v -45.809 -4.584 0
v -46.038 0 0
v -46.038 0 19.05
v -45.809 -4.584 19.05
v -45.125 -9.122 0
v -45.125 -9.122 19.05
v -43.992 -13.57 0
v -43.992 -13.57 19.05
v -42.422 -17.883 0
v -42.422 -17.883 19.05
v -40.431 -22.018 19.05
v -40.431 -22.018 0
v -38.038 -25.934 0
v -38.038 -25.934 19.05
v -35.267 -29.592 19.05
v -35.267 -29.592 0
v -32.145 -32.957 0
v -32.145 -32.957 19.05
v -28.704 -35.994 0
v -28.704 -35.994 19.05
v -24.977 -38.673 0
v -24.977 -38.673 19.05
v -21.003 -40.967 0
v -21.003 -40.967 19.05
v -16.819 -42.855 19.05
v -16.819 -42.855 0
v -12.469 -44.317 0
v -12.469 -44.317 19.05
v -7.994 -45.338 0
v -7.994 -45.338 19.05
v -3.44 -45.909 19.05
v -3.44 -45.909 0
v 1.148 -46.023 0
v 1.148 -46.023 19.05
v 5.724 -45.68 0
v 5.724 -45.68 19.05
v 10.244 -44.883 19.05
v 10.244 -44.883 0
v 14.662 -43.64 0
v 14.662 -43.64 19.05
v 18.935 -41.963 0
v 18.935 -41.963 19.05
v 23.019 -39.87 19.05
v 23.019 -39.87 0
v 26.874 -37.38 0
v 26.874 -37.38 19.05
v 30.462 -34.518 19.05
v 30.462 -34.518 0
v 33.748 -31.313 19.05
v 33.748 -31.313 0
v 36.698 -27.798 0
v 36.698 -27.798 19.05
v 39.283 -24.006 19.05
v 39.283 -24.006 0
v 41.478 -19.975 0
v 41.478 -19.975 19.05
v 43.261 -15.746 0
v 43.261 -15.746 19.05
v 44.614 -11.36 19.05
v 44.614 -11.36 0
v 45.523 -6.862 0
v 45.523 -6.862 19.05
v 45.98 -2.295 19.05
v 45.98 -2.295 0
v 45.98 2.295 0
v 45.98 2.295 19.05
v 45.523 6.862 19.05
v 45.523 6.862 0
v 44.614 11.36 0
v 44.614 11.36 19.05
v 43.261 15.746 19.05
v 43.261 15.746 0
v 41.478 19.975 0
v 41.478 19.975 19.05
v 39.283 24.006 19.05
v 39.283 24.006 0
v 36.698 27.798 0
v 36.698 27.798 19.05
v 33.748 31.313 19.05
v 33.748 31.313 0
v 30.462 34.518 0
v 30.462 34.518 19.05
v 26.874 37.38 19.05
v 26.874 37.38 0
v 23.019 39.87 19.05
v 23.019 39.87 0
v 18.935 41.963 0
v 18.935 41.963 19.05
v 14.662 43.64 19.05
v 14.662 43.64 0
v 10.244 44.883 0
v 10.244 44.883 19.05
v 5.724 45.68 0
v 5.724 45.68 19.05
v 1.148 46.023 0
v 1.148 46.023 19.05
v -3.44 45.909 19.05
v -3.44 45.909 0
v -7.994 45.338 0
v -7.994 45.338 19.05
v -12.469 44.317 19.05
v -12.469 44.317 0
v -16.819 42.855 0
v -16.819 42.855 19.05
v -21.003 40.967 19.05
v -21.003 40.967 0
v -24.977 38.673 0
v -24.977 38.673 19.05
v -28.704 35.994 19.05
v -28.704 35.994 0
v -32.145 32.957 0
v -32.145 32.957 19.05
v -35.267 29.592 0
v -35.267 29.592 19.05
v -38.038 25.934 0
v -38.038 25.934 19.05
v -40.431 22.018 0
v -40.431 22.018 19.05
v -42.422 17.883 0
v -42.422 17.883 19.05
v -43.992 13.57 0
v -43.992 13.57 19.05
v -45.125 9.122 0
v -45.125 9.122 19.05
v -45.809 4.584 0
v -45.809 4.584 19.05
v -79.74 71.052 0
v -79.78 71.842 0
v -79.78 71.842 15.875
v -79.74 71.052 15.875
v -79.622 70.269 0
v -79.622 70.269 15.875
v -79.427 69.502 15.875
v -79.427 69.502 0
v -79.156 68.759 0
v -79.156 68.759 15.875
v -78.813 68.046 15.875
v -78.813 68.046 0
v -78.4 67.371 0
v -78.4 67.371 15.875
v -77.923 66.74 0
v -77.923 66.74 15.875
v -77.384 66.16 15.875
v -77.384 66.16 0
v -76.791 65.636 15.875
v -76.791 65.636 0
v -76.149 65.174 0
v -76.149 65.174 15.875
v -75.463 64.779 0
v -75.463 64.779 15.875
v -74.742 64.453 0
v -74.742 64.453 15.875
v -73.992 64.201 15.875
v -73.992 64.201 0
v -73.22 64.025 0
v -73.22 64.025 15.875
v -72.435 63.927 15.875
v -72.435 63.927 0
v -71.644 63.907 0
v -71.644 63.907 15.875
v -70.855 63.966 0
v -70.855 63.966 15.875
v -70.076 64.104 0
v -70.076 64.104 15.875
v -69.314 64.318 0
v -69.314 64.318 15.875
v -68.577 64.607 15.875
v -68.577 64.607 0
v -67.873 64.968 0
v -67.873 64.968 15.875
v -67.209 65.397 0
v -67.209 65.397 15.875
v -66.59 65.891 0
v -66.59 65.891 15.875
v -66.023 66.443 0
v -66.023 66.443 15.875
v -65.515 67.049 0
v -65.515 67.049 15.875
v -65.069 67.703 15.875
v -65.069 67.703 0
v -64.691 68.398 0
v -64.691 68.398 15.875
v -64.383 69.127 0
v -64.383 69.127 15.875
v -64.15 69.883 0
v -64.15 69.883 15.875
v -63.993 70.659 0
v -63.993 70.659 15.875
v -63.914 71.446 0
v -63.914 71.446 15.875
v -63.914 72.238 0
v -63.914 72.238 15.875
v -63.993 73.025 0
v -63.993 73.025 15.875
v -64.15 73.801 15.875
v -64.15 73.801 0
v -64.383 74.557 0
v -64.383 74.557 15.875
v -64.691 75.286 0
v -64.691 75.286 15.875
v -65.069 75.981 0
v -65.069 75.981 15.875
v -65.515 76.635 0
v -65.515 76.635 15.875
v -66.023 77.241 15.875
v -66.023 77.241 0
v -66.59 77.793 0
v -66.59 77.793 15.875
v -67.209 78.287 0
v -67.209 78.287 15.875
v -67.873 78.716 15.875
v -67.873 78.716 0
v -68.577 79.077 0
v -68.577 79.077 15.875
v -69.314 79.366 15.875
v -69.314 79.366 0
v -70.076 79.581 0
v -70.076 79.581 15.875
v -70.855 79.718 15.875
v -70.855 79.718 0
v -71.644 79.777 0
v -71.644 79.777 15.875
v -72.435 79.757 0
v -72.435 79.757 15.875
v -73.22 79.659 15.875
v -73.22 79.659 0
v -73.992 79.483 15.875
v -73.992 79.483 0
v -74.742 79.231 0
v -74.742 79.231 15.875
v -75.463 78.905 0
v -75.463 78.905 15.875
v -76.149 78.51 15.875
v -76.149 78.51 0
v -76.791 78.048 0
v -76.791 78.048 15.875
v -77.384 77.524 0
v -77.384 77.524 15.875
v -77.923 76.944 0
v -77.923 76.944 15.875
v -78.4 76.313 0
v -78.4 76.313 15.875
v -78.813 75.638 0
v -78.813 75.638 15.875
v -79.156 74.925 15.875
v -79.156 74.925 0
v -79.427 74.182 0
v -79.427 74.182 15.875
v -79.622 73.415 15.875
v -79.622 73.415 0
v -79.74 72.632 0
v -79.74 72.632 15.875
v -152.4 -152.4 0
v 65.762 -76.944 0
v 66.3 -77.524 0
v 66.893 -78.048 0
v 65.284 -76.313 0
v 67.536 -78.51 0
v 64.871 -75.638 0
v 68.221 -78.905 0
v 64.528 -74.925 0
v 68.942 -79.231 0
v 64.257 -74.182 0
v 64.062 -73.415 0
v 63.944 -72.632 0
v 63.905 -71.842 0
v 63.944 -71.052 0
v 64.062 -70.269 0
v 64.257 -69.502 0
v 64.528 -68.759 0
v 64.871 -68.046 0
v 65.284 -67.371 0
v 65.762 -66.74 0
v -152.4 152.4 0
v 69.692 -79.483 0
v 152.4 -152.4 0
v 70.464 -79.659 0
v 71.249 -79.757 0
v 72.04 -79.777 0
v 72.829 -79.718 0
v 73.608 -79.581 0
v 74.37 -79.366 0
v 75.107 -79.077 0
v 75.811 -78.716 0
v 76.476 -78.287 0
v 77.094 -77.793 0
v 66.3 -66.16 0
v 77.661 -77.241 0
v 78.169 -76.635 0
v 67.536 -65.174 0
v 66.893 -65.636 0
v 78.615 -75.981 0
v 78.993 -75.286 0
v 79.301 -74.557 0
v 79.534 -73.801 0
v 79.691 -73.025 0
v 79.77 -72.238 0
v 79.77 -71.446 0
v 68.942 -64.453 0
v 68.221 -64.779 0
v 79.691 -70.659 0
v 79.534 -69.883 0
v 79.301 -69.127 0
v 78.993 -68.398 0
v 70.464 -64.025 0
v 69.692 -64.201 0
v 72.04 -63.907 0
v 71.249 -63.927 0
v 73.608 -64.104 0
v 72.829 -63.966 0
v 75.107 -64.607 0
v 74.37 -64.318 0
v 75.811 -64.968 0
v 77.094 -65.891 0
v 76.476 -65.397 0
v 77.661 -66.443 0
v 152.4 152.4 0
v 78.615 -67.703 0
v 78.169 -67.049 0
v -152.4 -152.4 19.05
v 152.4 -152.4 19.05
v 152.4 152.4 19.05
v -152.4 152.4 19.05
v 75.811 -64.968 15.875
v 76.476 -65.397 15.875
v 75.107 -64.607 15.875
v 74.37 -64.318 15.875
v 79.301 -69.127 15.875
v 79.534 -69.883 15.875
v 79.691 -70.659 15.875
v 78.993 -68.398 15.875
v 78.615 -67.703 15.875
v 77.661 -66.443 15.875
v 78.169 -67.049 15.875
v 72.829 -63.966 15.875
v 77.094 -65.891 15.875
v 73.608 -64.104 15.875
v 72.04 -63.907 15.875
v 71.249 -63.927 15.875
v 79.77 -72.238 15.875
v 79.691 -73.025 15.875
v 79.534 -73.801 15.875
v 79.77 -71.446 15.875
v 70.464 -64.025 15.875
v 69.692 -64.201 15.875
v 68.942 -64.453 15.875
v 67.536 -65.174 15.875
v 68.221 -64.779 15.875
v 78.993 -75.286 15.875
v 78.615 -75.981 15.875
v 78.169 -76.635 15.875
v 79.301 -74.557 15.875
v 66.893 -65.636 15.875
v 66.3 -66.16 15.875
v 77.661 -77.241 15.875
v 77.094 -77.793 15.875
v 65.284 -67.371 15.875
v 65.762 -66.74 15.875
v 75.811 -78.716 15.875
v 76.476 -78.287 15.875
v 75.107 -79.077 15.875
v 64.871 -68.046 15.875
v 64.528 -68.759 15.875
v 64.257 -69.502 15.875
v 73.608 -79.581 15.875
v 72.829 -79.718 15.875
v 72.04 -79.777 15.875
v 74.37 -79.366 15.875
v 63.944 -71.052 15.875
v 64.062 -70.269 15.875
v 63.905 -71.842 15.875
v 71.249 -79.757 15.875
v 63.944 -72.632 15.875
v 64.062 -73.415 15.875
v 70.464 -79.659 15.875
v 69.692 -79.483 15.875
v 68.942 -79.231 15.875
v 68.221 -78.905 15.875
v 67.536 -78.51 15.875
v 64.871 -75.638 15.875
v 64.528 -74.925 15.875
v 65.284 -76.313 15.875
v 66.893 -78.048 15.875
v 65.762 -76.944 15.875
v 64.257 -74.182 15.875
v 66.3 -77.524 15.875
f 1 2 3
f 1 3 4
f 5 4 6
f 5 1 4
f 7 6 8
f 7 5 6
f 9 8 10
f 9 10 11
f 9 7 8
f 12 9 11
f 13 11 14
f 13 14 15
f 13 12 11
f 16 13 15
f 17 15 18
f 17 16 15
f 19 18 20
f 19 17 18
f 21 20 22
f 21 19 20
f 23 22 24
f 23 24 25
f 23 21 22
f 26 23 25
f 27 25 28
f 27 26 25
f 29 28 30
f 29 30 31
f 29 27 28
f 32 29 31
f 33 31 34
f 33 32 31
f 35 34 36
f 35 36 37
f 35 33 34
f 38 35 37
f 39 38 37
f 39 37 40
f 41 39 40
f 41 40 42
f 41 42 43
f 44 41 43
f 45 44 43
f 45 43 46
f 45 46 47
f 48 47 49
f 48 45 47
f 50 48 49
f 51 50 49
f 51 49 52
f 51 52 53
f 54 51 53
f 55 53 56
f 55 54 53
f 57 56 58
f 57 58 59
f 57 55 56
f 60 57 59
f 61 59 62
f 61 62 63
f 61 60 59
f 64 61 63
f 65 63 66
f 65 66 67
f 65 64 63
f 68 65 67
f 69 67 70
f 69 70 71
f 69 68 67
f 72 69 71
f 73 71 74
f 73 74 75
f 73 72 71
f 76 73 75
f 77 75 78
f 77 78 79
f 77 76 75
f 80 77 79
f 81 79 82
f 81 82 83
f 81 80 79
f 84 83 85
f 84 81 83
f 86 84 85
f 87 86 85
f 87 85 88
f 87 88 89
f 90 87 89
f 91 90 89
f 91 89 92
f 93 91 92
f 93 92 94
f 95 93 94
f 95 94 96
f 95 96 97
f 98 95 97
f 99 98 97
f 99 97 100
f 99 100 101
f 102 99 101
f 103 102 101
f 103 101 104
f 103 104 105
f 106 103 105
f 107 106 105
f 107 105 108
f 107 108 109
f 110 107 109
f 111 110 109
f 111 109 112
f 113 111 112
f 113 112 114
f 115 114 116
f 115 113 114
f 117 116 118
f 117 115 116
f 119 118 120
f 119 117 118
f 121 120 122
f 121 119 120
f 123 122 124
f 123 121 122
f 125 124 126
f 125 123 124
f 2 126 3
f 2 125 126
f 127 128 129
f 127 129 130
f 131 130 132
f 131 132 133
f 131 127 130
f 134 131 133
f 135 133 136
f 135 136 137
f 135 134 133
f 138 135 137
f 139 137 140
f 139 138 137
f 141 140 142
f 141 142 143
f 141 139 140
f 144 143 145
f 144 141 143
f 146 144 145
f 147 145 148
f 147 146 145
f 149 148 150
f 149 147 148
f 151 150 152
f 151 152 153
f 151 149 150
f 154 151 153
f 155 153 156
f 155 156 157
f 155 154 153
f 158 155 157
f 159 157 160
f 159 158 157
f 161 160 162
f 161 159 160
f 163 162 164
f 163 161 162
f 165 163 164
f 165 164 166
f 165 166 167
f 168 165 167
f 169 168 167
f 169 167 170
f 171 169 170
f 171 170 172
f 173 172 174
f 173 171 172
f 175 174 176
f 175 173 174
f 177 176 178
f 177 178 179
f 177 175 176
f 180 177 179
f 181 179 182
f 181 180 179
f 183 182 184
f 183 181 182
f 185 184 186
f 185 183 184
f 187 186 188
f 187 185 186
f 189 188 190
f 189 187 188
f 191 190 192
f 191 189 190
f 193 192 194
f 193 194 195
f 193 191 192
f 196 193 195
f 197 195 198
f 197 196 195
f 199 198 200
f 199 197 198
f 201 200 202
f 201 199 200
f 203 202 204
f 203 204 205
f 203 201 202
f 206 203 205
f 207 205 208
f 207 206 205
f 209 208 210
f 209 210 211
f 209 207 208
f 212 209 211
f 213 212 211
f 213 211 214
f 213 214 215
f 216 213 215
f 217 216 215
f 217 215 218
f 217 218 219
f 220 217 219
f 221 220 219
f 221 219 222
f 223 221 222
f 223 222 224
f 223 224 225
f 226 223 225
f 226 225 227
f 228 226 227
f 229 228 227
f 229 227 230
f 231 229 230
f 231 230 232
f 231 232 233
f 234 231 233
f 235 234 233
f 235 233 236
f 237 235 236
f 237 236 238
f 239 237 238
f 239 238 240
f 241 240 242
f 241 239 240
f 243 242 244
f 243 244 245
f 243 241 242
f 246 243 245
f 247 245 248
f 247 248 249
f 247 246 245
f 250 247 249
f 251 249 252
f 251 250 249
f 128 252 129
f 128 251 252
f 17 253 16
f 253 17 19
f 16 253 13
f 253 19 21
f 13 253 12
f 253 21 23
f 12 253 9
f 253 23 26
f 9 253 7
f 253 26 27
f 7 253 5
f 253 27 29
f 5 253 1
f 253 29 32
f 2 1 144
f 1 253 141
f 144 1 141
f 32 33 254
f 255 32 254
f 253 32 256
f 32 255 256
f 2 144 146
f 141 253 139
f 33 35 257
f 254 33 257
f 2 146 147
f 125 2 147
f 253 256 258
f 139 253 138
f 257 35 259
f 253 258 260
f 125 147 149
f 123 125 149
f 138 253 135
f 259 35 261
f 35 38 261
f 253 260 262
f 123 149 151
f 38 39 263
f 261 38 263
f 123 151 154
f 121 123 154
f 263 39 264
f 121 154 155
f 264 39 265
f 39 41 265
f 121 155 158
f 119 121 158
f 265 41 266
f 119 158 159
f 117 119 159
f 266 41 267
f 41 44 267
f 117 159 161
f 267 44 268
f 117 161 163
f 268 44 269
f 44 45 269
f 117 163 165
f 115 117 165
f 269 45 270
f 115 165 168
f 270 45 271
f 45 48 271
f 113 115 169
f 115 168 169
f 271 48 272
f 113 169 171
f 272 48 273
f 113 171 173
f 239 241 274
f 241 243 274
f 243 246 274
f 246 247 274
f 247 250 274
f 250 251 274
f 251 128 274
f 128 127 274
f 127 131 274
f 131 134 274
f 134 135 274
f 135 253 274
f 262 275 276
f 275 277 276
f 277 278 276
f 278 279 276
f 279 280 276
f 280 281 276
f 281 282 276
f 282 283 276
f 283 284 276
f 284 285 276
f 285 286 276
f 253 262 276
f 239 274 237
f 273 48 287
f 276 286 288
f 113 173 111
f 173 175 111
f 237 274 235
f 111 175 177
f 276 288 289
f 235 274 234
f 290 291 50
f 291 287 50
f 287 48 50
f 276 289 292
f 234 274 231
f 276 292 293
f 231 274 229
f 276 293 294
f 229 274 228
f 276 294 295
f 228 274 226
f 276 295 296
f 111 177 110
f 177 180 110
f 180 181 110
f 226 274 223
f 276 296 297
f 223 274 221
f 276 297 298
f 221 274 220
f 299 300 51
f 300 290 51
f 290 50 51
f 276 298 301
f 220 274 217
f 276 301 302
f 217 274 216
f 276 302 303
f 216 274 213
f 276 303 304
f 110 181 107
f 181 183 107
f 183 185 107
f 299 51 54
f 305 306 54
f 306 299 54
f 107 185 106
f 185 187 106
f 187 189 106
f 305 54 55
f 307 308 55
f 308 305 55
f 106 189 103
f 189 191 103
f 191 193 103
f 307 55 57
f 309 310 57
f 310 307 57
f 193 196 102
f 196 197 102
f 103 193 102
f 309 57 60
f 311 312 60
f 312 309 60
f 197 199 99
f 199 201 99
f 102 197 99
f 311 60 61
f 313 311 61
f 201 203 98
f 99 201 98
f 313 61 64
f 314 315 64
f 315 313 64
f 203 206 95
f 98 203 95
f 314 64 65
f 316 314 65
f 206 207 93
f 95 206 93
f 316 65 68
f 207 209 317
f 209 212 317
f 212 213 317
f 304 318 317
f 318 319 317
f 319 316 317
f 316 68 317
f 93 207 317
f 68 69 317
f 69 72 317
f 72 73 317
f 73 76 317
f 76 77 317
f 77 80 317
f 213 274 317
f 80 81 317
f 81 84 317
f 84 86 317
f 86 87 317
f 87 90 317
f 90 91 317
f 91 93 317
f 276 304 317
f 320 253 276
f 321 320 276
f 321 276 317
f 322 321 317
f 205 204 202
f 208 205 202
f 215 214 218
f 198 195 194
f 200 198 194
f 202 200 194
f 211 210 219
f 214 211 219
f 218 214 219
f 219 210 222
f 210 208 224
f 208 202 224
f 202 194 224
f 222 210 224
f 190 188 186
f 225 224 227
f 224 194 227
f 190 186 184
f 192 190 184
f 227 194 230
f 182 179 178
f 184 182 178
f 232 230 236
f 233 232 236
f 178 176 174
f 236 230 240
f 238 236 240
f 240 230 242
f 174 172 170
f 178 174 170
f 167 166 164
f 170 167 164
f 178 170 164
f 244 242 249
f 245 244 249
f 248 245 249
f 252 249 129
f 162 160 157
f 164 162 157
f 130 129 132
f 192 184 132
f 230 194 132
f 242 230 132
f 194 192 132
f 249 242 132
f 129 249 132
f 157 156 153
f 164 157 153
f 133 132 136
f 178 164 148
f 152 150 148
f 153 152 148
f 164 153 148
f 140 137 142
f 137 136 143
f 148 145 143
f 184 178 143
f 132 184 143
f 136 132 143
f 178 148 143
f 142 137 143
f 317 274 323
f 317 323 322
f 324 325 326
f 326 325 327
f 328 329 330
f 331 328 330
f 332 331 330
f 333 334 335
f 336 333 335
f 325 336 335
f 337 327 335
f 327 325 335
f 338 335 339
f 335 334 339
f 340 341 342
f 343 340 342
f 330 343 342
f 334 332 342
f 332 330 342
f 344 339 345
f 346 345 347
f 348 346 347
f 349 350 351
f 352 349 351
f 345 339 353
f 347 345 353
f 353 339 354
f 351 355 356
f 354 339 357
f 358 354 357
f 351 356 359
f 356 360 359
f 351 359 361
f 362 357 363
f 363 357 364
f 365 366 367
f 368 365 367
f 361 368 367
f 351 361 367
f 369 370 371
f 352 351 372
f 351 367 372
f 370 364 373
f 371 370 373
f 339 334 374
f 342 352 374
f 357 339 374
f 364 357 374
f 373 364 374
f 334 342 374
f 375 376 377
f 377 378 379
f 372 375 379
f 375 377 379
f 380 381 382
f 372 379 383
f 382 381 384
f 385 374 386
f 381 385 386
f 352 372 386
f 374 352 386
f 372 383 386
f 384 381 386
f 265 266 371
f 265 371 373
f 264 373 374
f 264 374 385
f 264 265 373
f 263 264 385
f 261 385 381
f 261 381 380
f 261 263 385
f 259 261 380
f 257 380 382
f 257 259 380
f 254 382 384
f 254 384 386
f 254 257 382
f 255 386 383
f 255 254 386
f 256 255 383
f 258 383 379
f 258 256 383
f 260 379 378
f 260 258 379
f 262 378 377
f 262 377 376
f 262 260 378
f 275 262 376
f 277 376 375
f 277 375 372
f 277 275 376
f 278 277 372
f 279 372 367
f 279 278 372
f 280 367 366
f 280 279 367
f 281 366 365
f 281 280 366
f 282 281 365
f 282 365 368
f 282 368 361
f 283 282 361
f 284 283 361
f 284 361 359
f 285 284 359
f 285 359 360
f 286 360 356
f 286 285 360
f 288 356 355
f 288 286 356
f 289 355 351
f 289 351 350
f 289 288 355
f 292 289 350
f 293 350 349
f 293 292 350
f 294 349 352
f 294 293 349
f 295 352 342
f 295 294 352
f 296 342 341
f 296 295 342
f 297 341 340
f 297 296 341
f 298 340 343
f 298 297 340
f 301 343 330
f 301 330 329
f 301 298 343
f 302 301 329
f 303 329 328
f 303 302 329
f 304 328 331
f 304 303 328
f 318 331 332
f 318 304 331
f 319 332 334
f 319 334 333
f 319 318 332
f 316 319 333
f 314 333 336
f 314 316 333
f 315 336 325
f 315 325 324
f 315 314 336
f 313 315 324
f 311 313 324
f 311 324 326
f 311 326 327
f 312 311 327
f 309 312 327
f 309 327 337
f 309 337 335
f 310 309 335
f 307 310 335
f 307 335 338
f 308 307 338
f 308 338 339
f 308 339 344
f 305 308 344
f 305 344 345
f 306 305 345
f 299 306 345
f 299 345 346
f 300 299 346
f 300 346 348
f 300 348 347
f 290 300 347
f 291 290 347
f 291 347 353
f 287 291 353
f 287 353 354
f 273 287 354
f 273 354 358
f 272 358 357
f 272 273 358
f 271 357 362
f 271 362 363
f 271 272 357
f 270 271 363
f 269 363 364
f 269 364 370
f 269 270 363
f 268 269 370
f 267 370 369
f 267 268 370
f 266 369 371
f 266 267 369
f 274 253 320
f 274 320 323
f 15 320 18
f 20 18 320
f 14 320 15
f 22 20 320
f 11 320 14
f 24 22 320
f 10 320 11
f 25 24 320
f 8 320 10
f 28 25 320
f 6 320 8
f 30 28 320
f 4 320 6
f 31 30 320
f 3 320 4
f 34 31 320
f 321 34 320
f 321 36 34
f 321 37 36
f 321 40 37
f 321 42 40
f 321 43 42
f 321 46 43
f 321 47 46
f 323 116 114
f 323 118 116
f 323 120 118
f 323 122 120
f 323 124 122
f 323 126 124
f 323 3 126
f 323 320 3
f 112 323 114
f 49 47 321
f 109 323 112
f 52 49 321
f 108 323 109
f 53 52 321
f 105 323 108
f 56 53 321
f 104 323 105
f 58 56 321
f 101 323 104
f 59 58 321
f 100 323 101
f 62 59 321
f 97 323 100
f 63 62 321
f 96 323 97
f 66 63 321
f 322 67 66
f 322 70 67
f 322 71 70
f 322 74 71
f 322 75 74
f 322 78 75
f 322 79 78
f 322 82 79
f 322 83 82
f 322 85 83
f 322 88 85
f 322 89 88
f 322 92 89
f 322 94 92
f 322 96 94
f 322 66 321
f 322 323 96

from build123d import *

# Parameters (mm, degrees)
SKETCH1_W           = 304.8
SKETCH1_H           = 304.8
SKETCH1_R           = 46.0375
BOSS_EXTRUDE1_DEPTH = 19.05
SKETCH2_R           = 7.9375
CUT_EXTRUDE1_DEPTH  = 15.875


with BuildPart() as part:
    # Sketch1 → Boss-Extrude1 (new body)
    with BuildSketch(Plane.XY):
        Rectangle(SKETCH1_W, SKETCH1_H)
        with Locations(Location((0, 0, 0), (0, 0, 180))):
            Circle(SKETCH1_R, mode=Mode.SUBTRACT)
    extrude(amount=BOSS_EXTRUDE1_DEPTH)

    # Sketch2 → Cut-Extrude1 (cut)
    with BuildSketch(Plane.XY):
        with Locations(Location((-71.842048969, 71.842048969, 0), (0, 0, 180))):
            Circle(SKETCH2_R)
        with Locations(Location((71.842048969, -71.842048969, 0), (0, 0, 180))):
            Circle(SKETCH2_R)
    extrude(amount=CUT_EXTRUDE1_DEPTH, mode=Mode.SUBTRACT)


solid = part.part
